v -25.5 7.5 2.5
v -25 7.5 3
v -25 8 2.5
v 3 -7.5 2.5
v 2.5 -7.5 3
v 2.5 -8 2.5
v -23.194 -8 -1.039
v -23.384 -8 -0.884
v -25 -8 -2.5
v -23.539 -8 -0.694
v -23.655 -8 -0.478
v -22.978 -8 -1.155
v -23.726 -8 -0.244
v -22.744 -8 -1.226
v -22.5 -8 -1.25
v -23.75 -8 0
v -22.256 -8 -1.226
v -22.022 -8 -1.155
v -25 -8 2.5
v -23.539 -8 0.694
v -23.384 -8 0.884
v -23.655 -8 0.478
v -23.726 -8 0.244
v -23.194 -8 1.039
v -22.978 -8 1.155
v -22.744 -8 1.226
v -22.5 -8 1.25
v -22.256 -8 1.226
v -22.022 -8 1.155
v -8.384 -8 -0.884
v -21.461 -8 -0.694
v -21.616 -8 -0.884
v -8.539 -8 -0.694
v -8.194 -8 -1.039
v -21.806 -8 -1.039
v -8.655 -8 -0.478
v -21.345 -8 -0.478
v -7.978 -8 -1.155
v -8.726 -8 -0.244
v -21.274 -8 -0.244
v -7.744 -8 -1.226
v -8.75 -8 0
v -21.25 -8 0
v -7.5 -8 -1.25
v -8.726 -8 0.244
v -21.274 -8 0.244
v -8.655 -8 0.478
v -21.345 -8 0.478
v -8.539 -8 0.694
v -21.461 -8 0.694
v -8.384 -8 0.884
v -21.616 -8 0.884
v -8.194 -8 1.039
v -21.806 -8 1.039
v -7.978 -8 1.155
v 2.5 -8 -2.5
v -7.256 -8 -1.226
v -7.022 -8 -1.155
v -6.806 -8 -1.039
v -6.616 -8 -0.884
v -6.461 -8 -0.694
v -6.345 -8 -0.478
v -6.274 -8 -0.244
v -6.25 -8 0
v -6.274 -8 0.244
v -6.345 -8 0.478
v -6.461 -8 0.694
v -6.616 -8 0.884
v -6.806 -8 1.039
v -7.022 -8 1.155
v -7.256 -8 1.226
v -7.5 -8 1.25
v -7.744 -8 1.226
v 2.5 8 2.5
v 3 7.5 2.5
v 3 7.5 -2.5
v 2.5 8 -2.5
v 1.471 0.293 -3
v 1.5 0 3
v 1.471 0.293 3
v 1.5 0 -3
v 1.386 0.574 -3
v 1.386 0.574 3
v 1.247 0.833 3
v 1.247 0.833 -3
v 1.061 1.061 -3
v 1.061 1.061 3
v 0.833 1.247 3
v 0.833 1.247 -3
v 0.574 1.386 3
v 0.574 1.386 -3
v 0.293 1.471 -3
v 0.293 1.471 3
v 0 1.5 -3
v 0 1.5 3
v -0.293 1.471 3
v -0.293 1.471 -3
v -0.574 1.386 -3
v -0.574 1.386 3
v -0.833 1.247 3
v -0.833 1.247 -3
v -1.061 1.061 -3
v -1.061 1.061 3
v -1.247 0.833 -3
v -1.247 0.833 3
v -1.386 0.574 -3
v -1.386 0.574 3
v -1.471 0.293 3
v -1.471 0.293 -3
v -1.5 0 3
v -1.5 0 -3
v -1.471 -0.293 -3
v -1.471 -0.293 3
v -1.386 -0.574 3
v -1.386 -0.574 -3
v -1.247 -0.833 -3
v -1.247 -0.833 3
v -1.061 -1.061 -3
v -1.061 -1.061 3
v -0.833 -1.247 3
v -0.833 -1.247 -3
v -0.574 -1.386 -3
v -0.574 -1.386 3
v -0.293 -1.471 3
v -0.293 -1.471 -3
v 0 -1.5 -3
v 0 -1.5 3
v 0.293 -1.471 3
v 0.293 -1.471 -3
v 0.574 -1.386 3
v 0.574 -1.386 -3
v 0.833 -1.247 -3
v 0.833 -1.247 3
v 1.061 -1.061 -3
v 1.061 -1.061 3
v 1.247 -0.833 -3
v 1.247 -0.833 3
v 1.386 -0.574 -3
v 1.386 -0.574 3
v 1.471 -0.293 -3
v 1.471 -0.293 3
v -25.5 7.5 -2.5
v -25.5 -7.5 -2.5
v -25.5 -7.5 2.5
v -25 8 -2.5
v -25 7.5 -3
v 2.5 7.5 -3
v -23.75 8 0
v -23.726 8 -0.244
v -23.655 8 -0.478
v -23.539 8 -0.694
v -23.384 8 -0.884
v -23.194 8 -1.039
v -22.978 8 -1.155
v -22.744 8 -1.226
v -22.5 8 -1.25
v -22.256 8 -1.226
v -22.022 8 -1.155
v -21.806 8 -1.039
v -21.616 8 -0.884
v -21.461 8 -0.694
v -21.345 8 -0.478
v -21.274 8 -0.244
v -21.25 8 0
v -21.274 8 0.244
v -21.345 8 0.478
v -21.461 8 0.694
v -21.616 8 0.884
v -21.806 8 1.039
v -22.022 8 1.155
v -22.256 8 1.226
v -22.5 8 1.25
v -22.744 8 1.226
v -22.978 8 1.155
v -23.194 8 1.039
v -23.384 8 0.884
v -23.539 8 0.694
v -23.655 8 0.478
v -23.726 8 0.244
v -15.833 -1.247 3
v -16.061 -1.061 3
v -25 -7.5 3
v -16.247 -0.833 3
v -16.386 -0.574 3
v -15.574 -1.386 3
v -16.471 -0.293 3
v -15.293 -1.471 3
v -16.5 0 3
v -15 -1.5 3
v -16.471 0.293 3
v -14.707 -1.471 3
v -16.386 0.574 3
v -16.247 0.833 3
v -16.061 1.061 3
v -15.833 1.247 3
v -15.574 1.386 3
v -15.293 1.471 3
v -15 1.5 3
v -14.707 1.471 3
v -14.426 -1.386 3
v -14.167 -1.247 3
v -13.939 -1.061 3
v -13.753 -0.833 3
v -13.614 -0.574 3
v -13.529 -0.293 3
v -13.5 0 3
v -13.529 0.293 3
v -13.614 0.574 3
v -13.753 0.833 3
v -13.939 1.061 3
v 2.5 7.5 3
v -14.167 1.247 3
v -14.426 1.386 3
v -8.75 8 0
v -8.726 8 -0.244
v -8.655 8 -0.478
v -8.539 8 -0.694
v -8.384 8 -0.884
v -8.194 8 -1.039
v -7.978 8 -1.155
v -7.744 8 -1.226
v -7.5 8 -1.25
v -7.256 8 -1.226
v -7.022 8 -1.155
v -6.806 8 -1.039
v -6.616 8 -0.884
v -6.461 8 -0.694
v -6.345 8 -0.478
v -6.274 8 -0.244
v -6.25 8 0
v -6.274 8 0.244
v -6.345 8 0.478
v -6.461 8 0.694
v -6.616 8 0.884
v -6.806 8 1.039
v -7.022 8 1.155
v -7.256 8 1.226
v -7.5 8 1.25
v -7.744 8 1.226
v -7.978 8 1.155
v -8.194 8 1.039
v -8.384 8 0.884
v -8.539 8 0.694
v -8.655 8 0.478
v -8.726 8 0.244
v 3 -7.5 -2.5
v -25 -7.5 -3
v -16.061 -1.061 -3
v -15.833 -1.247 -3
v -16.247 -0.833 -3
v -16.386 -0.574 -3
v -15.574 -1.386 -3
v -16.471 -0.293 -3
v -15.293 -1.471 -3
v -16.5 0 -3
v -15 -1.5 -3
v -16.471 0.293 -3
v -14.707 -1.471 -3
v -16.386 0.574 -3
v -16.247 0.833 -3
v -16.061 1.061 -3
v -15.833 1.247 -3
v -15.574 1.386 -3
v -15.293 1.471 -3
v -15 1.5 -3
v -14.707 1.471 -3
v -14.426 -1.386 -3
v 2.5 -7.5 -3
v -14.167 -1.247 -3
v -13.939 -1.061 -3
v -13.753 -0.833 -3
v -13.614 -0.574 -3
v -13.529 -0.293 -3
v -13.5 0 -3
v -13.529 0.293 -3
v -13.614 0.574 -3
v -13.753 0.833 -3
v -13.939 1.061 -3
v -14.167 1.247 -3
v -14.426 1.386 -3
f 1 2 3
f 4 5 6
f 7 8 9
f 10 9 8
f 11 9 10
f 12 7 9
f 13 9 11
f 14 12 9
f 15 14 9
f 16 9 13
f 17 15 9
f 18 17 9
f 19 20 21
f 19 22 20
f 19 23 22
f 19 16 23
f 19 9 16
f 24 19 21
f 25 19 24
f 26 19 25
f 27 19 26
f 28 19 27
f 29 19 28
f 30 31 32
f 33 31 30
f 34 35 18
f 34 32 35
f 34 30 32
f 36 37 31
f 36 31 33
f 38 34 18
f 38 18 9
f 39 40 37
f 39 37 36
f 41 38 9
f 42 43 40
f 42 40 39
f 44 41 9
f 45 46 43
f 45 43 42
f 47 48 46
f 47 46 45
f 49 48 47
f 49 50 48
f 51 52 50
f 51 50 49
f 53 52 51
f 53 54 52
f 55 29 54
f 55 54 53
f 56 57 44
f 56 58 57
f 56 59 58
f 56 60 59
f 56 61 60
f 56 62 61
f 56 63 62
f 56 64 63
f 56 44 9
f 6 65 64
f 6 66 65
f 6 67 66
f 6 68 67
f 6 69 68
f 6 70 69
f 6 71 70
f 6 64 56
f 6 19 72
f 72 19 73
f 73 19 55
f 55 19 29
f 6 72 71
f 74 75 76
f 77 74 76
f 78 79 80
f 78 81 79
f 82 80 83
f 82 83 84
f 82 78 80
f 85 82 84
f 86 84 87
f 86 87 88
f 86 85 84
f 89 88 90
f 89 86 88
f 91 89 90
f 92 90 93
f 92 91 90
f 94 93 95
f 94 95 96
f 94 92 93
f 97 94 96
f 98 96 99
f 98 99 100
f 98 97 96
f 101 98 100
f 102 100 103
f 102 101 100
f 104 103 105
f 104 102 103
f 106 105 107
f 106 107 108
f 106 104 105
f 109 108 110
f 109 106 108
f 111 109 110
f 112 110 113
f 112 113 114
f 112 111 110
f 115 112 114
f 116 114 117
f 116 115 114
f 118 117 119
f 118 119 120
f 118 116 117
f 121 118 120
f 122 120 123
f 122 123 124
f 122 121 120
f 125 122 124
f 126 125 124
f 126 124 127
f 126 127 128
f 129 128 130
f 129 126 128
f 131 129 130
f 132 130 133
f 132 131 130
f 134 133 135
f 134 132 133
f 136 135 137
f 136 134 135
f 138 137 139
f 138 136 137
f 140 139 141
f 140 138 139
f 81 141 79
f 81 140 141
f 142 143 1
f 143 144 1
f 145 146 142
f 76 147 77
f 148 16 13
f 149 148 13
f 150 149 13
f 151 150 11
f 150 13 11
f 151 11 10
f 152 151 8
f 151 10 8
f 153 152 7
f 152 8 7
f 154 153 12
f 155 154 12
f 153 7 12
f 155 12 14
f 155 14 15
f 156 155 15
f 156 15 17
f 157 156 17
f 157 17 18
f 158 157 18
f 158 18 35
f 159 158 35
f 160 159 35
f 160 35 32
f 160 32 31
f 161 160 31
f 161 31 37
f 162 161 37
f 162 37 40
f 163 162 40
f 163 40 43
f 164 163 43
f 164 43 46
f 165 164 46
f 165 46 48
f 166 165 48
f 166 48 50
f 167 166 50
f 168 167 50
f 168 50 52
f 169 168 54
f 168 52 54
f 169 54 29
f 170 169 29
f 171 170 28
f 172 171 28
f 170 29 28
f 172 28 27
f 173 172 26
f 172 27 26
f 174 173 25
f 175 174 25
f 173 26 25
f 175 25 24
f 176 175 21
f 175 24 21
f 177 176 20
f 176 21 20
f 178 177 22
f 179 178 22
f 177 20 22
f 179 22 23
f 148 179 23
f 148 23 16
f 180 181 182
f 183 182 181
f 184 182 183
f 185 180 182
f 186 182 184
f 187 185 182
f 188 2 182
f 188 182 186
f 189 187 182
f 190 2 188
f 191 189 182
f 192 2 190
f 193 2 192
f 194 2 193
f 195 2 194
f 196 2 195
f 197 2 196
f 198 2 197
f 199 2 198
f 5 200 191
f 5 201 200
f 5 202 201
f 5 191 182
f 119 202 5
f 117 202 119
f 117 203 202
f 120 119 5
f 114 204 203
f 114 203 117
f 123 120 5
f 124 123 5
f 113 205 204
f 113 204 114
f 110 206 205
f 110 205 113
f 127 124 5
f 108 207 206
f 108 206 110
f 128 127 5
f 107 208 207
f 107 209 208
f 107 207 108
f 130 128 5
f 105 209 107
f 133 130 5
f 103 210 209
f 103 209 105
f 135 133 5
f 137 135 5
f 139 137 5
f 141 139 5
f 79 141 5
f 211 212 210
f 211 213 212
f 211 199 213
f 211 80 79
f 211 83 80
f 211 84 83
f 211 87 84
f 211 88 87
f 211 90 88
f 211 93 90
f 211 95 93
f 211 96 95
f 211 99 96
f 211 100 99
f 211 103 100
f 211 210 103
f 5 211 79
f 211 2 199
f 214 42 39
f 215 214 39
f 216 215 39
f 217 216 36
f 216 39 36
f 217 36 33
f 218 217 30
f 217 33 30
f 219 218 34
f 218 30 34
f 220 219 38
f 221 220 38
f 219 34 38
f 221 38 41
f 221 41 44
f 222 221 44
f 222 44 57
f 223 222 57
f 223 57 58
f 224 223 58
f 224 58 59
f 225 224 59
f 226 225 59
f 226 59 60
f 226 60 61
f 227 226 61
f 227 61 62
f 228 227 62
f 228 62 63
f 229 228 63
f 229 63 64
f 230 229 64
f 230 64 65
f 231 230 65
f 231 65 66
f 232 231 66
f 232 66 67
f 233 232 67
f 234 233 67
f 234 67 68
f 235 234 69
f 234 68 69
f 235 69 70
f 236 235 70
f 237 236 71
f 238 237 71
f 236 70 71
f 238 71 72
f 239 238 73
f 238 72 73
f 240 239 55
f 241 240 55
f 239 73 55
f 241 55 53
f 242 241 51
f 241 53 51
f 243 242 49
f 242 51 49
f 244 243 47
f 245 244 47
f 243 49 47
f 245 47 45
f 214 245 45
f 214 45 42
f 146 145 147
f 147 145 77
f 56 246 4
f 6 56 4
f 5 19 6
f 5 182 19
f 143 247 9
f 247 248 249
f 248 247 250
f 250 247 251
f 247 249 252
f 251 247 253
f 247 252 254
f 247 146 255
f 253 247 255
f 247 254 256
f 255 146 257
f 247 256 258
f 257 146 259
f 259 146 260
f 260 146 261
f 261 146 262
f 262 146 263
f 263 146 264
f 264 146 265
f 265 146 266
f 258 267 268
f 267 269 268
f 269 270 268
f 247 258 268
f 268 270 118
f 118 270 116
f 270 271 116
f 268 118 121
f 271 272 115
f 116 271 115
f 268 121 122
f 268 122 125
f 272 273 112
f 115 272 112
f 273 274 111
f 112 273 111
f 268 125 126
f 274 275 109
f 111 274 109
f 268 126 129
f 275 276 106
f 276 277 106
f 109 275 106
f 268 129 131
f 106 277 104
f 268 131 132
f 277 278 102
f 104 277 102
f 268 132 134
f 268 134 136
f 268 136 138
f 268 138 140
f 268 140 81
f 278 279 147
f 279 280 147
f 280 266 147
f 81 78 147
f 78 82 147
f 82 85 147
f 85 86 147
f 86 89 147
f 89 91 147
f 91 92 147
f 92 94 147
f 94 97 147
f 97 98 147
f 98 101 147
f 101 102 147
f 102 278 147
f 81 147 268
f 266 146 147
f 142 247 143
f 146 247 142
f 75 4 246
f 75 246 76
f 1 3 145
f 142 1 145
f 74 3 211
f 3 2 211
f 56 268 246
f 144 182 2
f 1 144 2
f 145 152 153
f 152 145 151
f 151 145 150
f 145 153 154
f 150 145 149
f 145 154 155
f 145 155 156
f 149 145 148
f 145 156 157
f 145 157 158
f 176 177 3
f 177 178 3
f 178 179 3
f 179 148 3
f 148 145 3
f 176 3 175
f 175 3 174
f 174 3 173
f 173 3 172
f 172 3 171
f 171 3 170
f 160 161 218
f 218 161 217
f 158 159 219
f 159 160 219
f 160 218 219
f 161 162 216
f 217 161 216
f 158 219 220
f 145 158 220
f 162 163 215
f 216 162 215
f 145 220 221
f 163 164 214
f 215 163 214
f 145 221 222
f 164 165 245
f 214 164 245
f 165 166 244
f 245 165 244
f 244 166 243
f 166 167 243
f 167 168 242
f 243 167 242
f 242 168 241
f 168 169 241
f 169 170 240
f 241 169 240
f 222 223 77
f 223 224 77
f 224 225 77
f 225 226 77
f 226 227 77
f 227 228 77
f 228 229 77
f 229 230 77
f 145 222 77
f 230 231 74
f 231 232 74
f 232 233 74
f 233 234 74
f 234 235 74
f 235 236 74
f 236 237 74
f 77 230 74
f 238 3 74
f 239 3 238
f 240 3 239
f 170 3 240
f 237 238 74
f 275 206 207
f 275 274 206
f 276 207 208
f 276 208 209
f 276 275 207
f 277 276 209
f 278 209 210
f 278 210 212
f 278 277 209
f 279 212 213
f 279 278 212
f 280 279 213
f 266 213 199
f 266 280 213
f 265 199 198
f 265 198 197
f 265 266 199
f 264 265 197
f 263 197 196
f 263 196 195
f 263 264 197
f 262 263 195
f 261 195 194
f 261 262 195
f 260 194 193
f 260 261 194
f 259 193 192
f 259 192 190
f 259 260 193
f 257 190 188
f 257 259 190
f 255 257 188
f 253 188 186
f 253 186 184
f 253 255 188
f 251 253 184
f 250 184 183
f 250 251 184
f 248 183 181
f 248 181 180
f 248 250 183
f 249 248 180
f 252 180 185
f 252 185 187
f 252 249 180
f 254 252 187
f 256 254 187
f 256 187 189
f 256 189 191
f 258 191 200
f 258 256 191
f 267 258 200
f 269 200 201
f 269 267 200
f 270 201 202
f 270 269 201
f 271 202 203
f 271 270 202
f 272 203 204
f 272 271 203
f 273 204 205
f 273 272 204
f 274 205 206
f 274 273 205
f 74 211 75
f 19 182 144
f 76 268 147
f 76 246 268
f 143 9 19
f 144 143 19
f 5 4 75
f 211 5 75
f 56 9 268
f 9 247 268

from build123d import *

# Parameters (mm, degrees)
SKETCH_2_W         = 28.5
SKETCH_2_H         = 16
SKETCH_2_R         = 1.5
EXTRUDE_1_DEPTH    = 3
HOLE_WIZARD_M3_2_D = 2.5
CHAMFER_1_SIZE     = 0.5


with BuildPart() as part:
    # 草图2 → 凸台-拉伸1 (new body, symmetric)
    with BuildSketch(Plane.XY):
        with Locations((-11.25, 0)):
            Rectangle(SKETCH_2_W, SKETCH_2_H)
        with Locations((-15, 0)):
            Circle(SKETCH_2_R, mode=Mode.SUBTRACT)
        Circle(SKETCH_2_R, mode=Mode.SUBTRACT)
    extrude(amount=EXTRUDE_1_DEPTH, both=True)

    # M3 螺纹孔2 (through all)
    with Locations(Plane(origin=(0, 8, 0), x_dir=(1, 0, 0), z_dir=(0, 1, 0))):
        with Locations((-7.5, 0), (-22.5, 0)):
            Hole(HOLE_WIZARD_M3_2_D / 2)

    # 倒角1
    chamfer_1_edges = [part.edges().sort_by_distance(p)[0] for p in [
        (-11.25, -8, 3),
        (3, 0, 3),
        (-11.25, 8, 3),
        (3, 0, -3),
        (-11.25, -8, -3),
        (-25.5, 0, -3),
        (-11.25, 8, -3),
        (-25.5, 0, 3),
        (3, 8, 0),
        (3, -8, 0),
        (-25.5, -8, 0),
        (-25.5, 8, 0),
    ]]
    chamfer(chamfer_1_edges, length=CHAMFER_1_SIZE)


solid = part.part
